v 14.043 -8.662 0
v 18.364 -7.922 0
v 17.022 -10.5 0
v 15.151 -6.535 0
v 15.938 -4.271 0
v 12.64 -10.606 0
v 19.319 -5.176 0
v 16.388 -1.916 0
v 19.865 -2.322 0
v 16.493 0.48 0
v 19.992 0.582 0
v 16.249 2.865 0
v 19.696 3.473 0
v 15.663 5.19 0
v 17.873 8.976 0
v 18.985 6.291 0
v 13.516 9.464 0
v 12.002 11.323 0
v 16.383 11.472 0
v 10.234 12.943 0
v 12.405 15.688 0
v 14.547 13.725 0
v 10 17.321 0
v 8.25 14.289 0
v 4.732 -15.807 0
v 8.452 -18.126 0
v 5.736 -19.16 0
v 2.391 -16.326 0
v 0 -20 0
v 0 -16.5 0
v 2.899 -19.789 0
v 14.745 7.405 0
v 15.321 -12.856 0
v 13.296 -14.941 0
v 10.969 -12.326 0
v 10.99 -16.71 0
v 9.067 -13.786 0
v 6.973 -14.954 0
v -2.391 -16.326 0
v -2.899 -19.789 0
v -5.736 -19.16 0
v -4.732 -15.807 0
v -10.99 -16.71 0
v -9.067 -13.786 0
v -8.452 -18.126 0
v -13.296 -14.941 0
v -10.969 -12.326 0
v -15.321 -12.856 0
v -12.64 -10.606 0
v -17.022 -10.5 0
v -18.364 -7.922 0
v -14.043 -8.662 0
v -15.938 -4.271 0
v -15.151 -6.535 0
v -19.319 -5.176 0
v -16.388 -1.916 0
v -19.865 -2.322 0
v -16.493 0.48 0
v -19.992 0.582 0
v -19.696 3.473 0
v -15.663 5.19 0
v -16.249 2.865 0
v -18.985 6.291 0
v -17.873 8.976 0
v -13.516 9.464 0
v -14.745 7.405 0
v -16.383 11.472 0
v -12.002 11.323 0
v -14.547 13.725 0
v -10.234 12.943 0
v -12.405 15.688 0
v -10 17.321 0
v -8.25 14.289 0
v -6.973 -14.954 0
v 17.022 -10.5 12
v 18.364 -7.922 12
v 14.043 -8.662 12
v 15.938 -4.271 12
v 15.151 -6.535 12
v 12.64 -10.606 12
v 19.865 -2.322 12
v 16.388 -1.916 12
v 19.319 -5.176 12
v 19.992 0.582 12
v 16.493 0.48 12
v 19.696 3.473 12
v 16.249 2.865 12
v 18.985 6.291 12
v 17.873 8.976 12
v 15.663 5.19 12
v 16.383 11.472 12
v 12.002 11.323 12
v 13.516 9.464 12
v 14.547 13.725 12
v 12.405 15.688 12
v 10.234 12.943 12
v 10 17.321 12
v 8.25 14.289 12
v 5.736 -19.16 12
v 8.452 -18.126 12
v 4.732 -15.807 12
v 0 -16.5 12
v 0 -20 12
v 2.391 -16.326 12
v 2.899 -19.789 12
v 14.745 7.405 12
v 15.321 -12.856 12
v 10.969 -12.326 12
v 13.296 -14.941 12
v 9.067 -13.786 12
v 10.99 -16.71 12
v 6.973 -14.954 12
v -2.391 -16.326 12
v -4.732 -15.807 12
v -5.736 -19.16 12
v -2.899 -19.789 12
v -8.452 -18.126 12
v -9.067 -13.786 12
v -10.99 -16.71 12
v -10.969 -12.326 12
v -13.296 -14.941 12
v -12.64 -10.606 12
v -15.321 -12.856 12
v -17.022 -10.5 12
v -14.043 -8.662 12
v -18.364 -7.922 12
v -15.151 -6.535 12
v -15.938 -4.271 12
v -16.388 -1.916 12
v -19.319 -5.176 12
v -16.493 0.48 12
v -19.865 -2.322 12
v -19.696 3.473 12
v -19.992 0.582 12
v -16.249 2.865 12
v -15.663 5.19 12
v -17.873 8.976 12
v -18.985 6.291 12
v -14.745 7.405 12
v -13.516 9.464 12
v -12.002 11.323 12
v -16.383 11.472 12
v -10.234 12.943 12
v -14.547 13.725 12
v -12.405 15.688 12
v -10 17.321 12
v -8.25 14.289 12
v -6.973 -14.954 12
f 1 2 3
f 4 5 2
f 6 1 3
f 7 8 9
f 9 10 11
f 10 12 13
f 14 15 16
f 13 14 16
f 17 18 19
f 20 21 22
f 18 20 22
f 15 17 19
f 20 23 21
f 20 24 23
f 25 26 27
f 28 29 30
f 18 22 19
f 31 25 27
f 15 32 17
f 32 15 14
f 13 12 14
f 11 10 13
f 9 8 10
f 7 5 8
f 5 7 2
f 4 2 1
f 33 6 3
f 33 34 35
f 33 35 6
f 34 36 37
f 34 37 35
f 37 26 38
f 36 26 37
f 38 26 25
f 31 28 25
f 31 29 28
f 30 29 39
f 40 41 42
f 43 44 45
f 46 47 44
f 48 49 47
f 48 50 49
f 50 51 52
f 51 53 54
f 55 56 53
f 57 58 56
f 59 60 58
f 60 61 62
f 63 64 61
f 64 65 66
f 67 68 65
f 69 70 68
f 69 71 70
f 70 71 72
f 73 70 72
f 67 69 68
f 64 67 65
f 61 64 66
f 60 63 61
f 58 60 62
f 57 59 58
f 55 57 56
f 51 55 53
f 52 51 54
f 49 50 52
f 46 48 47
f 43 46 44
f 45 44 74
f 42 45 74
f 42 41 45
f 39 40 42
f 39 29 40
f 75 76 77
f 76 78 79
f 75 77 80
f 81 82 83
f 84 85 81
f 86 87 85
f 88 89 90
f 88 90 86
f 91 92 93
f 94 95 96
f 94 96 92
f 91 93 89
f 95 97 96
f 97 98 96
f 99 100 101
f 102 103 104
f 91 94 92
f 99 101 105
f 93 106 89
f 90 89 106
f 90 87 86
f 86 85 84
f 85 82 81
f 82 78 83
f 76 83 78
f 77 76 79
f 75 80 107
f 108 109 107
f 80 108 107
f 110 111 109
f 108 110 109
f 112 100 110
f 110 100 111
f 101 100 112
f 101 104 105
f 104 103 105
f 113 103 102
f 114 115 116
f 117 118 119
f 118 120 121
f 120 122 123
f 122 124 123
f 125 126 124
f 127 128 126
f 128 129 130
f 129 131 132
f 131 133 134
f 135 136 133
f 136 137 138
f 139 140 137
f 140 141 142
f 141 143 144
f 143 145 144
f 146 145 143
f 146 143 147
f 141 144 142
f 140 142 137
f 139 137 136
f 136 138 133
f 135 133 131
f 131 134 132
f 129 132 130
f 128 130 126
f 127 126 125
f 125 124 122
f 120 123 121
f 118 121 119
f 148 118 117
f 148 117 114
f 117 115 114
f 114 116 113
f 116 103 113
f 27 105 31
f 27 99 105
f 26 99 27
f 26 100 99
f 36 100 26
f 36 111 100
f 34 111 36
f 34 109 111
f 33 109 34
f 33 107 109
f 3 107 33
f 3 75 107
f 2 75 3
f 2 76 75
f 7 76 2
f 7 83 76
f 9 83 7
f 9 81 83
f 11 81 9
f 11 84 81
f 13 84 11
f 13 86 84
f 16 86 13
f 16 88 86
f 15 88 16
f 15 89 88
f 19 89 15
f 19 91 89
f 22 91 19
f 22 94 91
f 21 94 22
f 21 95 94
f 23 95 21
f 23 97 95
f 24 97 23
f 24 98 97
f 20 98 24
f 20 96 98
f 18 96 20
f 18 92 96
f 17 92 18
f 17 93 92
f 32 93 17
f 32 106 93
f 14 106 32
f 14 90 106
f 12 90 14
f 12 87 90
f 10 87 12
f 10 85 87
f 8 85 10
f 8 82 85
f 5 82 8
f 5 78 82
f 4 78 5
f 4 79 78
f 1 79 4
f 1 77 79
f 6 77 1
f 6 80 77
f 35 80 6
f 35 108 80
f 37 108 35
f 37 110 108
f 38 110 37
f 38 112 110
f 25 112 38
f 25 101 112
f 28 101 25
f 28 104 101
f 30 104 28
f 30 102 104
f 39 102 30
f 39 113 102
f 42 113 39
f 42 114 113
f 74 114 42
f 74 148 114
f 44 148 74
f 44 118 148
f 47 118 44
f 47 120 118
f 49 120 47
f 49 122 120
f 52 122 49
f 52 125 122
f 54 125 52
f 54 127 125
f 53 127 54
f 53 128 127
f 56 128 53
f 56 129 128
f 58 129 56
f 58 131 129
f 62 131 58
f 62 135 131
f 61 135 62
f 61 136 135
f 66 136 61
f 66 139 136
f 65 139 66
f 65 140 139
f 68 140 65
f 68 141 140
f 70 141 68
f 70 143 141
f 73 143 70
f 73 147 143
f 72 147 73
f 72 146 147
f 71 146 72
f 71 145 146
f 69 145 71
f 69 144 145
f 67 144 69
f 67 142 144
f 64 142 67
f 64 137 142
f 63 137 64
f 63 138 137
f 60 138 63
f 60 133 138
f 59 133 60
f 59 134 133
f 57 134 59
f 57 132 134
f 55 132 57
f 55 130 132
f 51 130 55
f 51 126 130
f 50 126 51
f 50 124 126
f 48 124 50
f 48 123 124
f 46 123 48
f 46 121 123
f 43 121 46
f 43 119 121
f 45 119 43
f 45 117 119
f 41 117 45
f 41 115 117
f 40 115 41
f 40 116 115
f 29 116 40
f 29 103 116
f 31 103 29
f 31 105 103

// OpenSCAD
$fn = 32;

// ----------------------------------------------------------------------
// Spring clip: 40 mm outside, 3.5 mm band, 60 degree opening
// ----------------------------------------------------------------------

// --- parameters (mm) ---
outer_r = 20;             // clip outside radius
inner_r = 16.5;           // clip bore radius
band = 3.5;               // band thickness
clip_w = 12;              // clip width
opening = 60;             // opening angle

clip_profile = [[-10, 17.321], [-12.405, 15.688], [-14.547, 13.725], [-16.383, 11.472], [-17.873, 8.976], [-18.985, 6.291], [-19.696, 3.473], [-19.992, 0.582], [-19.865, -2.322], [-19.319, -5.176], [-18.364, -7.922], [-17.022, -10.5], [-15.321, -12.856], [-13.296, -14.941], [-10.99, -16.71], [-8.452, -18.126], [-5.736, -19.16], [-2.899, -19.789], [0, -20], [2.899, -19.789], [5.736, -19.16], [8.452, -18.126], [10.99, -16.71], [13.296, -14.941], [15.321, -12.856], [17.022, -10.5], [18.364, -7.922], [19.319, -5.176], [19.865, -2.322], [19.992, 0.582], [19.696, 3.473], [18.985, 6.291], [17.873, 8.976], [16.383, 11.472], [14.547, 13.725], [12.405, 15.688], [10, 17.321], [8.25, 14.289], [10.234, 12.943], [12.002, 11.323], [13.516, 9.464], [14.745, 7.405], [15.663, 5.19], [16.249, 2.865], [16.493, 0.48], [16.388, -1.916], [15.938, -4.271], [15.151, -6.535], [14.043, -8.662], [12.64, -10.606], [10.969, -12.326], [9.067, -13.786], [6.973, -14.954], [4.732, -15.807], [2.391, -16.326], [0, -16.5], [-2.391, -16.326], [-4.732, -15.807], [-6.973, -14.954], [-9.067, -13.786], [-10.969, -12.326], [-12.64, -10.606], [-14.043, -8.662], [-15.151, -6.535], [-15.938, -4.271], [-16.388, -1.916], [-16.493, 0.48], [-16.249, 2.865], [-15.663, 5.19], [-14.745, 7.405], [-13.516, 9.464], [-12.002, 11.323], [-10.234, 12.943], [-8.25, 14.289]];

difference() {
  union() {
    linear_extrude(height = clip_w) polygon(clip_profile);
  }
}
